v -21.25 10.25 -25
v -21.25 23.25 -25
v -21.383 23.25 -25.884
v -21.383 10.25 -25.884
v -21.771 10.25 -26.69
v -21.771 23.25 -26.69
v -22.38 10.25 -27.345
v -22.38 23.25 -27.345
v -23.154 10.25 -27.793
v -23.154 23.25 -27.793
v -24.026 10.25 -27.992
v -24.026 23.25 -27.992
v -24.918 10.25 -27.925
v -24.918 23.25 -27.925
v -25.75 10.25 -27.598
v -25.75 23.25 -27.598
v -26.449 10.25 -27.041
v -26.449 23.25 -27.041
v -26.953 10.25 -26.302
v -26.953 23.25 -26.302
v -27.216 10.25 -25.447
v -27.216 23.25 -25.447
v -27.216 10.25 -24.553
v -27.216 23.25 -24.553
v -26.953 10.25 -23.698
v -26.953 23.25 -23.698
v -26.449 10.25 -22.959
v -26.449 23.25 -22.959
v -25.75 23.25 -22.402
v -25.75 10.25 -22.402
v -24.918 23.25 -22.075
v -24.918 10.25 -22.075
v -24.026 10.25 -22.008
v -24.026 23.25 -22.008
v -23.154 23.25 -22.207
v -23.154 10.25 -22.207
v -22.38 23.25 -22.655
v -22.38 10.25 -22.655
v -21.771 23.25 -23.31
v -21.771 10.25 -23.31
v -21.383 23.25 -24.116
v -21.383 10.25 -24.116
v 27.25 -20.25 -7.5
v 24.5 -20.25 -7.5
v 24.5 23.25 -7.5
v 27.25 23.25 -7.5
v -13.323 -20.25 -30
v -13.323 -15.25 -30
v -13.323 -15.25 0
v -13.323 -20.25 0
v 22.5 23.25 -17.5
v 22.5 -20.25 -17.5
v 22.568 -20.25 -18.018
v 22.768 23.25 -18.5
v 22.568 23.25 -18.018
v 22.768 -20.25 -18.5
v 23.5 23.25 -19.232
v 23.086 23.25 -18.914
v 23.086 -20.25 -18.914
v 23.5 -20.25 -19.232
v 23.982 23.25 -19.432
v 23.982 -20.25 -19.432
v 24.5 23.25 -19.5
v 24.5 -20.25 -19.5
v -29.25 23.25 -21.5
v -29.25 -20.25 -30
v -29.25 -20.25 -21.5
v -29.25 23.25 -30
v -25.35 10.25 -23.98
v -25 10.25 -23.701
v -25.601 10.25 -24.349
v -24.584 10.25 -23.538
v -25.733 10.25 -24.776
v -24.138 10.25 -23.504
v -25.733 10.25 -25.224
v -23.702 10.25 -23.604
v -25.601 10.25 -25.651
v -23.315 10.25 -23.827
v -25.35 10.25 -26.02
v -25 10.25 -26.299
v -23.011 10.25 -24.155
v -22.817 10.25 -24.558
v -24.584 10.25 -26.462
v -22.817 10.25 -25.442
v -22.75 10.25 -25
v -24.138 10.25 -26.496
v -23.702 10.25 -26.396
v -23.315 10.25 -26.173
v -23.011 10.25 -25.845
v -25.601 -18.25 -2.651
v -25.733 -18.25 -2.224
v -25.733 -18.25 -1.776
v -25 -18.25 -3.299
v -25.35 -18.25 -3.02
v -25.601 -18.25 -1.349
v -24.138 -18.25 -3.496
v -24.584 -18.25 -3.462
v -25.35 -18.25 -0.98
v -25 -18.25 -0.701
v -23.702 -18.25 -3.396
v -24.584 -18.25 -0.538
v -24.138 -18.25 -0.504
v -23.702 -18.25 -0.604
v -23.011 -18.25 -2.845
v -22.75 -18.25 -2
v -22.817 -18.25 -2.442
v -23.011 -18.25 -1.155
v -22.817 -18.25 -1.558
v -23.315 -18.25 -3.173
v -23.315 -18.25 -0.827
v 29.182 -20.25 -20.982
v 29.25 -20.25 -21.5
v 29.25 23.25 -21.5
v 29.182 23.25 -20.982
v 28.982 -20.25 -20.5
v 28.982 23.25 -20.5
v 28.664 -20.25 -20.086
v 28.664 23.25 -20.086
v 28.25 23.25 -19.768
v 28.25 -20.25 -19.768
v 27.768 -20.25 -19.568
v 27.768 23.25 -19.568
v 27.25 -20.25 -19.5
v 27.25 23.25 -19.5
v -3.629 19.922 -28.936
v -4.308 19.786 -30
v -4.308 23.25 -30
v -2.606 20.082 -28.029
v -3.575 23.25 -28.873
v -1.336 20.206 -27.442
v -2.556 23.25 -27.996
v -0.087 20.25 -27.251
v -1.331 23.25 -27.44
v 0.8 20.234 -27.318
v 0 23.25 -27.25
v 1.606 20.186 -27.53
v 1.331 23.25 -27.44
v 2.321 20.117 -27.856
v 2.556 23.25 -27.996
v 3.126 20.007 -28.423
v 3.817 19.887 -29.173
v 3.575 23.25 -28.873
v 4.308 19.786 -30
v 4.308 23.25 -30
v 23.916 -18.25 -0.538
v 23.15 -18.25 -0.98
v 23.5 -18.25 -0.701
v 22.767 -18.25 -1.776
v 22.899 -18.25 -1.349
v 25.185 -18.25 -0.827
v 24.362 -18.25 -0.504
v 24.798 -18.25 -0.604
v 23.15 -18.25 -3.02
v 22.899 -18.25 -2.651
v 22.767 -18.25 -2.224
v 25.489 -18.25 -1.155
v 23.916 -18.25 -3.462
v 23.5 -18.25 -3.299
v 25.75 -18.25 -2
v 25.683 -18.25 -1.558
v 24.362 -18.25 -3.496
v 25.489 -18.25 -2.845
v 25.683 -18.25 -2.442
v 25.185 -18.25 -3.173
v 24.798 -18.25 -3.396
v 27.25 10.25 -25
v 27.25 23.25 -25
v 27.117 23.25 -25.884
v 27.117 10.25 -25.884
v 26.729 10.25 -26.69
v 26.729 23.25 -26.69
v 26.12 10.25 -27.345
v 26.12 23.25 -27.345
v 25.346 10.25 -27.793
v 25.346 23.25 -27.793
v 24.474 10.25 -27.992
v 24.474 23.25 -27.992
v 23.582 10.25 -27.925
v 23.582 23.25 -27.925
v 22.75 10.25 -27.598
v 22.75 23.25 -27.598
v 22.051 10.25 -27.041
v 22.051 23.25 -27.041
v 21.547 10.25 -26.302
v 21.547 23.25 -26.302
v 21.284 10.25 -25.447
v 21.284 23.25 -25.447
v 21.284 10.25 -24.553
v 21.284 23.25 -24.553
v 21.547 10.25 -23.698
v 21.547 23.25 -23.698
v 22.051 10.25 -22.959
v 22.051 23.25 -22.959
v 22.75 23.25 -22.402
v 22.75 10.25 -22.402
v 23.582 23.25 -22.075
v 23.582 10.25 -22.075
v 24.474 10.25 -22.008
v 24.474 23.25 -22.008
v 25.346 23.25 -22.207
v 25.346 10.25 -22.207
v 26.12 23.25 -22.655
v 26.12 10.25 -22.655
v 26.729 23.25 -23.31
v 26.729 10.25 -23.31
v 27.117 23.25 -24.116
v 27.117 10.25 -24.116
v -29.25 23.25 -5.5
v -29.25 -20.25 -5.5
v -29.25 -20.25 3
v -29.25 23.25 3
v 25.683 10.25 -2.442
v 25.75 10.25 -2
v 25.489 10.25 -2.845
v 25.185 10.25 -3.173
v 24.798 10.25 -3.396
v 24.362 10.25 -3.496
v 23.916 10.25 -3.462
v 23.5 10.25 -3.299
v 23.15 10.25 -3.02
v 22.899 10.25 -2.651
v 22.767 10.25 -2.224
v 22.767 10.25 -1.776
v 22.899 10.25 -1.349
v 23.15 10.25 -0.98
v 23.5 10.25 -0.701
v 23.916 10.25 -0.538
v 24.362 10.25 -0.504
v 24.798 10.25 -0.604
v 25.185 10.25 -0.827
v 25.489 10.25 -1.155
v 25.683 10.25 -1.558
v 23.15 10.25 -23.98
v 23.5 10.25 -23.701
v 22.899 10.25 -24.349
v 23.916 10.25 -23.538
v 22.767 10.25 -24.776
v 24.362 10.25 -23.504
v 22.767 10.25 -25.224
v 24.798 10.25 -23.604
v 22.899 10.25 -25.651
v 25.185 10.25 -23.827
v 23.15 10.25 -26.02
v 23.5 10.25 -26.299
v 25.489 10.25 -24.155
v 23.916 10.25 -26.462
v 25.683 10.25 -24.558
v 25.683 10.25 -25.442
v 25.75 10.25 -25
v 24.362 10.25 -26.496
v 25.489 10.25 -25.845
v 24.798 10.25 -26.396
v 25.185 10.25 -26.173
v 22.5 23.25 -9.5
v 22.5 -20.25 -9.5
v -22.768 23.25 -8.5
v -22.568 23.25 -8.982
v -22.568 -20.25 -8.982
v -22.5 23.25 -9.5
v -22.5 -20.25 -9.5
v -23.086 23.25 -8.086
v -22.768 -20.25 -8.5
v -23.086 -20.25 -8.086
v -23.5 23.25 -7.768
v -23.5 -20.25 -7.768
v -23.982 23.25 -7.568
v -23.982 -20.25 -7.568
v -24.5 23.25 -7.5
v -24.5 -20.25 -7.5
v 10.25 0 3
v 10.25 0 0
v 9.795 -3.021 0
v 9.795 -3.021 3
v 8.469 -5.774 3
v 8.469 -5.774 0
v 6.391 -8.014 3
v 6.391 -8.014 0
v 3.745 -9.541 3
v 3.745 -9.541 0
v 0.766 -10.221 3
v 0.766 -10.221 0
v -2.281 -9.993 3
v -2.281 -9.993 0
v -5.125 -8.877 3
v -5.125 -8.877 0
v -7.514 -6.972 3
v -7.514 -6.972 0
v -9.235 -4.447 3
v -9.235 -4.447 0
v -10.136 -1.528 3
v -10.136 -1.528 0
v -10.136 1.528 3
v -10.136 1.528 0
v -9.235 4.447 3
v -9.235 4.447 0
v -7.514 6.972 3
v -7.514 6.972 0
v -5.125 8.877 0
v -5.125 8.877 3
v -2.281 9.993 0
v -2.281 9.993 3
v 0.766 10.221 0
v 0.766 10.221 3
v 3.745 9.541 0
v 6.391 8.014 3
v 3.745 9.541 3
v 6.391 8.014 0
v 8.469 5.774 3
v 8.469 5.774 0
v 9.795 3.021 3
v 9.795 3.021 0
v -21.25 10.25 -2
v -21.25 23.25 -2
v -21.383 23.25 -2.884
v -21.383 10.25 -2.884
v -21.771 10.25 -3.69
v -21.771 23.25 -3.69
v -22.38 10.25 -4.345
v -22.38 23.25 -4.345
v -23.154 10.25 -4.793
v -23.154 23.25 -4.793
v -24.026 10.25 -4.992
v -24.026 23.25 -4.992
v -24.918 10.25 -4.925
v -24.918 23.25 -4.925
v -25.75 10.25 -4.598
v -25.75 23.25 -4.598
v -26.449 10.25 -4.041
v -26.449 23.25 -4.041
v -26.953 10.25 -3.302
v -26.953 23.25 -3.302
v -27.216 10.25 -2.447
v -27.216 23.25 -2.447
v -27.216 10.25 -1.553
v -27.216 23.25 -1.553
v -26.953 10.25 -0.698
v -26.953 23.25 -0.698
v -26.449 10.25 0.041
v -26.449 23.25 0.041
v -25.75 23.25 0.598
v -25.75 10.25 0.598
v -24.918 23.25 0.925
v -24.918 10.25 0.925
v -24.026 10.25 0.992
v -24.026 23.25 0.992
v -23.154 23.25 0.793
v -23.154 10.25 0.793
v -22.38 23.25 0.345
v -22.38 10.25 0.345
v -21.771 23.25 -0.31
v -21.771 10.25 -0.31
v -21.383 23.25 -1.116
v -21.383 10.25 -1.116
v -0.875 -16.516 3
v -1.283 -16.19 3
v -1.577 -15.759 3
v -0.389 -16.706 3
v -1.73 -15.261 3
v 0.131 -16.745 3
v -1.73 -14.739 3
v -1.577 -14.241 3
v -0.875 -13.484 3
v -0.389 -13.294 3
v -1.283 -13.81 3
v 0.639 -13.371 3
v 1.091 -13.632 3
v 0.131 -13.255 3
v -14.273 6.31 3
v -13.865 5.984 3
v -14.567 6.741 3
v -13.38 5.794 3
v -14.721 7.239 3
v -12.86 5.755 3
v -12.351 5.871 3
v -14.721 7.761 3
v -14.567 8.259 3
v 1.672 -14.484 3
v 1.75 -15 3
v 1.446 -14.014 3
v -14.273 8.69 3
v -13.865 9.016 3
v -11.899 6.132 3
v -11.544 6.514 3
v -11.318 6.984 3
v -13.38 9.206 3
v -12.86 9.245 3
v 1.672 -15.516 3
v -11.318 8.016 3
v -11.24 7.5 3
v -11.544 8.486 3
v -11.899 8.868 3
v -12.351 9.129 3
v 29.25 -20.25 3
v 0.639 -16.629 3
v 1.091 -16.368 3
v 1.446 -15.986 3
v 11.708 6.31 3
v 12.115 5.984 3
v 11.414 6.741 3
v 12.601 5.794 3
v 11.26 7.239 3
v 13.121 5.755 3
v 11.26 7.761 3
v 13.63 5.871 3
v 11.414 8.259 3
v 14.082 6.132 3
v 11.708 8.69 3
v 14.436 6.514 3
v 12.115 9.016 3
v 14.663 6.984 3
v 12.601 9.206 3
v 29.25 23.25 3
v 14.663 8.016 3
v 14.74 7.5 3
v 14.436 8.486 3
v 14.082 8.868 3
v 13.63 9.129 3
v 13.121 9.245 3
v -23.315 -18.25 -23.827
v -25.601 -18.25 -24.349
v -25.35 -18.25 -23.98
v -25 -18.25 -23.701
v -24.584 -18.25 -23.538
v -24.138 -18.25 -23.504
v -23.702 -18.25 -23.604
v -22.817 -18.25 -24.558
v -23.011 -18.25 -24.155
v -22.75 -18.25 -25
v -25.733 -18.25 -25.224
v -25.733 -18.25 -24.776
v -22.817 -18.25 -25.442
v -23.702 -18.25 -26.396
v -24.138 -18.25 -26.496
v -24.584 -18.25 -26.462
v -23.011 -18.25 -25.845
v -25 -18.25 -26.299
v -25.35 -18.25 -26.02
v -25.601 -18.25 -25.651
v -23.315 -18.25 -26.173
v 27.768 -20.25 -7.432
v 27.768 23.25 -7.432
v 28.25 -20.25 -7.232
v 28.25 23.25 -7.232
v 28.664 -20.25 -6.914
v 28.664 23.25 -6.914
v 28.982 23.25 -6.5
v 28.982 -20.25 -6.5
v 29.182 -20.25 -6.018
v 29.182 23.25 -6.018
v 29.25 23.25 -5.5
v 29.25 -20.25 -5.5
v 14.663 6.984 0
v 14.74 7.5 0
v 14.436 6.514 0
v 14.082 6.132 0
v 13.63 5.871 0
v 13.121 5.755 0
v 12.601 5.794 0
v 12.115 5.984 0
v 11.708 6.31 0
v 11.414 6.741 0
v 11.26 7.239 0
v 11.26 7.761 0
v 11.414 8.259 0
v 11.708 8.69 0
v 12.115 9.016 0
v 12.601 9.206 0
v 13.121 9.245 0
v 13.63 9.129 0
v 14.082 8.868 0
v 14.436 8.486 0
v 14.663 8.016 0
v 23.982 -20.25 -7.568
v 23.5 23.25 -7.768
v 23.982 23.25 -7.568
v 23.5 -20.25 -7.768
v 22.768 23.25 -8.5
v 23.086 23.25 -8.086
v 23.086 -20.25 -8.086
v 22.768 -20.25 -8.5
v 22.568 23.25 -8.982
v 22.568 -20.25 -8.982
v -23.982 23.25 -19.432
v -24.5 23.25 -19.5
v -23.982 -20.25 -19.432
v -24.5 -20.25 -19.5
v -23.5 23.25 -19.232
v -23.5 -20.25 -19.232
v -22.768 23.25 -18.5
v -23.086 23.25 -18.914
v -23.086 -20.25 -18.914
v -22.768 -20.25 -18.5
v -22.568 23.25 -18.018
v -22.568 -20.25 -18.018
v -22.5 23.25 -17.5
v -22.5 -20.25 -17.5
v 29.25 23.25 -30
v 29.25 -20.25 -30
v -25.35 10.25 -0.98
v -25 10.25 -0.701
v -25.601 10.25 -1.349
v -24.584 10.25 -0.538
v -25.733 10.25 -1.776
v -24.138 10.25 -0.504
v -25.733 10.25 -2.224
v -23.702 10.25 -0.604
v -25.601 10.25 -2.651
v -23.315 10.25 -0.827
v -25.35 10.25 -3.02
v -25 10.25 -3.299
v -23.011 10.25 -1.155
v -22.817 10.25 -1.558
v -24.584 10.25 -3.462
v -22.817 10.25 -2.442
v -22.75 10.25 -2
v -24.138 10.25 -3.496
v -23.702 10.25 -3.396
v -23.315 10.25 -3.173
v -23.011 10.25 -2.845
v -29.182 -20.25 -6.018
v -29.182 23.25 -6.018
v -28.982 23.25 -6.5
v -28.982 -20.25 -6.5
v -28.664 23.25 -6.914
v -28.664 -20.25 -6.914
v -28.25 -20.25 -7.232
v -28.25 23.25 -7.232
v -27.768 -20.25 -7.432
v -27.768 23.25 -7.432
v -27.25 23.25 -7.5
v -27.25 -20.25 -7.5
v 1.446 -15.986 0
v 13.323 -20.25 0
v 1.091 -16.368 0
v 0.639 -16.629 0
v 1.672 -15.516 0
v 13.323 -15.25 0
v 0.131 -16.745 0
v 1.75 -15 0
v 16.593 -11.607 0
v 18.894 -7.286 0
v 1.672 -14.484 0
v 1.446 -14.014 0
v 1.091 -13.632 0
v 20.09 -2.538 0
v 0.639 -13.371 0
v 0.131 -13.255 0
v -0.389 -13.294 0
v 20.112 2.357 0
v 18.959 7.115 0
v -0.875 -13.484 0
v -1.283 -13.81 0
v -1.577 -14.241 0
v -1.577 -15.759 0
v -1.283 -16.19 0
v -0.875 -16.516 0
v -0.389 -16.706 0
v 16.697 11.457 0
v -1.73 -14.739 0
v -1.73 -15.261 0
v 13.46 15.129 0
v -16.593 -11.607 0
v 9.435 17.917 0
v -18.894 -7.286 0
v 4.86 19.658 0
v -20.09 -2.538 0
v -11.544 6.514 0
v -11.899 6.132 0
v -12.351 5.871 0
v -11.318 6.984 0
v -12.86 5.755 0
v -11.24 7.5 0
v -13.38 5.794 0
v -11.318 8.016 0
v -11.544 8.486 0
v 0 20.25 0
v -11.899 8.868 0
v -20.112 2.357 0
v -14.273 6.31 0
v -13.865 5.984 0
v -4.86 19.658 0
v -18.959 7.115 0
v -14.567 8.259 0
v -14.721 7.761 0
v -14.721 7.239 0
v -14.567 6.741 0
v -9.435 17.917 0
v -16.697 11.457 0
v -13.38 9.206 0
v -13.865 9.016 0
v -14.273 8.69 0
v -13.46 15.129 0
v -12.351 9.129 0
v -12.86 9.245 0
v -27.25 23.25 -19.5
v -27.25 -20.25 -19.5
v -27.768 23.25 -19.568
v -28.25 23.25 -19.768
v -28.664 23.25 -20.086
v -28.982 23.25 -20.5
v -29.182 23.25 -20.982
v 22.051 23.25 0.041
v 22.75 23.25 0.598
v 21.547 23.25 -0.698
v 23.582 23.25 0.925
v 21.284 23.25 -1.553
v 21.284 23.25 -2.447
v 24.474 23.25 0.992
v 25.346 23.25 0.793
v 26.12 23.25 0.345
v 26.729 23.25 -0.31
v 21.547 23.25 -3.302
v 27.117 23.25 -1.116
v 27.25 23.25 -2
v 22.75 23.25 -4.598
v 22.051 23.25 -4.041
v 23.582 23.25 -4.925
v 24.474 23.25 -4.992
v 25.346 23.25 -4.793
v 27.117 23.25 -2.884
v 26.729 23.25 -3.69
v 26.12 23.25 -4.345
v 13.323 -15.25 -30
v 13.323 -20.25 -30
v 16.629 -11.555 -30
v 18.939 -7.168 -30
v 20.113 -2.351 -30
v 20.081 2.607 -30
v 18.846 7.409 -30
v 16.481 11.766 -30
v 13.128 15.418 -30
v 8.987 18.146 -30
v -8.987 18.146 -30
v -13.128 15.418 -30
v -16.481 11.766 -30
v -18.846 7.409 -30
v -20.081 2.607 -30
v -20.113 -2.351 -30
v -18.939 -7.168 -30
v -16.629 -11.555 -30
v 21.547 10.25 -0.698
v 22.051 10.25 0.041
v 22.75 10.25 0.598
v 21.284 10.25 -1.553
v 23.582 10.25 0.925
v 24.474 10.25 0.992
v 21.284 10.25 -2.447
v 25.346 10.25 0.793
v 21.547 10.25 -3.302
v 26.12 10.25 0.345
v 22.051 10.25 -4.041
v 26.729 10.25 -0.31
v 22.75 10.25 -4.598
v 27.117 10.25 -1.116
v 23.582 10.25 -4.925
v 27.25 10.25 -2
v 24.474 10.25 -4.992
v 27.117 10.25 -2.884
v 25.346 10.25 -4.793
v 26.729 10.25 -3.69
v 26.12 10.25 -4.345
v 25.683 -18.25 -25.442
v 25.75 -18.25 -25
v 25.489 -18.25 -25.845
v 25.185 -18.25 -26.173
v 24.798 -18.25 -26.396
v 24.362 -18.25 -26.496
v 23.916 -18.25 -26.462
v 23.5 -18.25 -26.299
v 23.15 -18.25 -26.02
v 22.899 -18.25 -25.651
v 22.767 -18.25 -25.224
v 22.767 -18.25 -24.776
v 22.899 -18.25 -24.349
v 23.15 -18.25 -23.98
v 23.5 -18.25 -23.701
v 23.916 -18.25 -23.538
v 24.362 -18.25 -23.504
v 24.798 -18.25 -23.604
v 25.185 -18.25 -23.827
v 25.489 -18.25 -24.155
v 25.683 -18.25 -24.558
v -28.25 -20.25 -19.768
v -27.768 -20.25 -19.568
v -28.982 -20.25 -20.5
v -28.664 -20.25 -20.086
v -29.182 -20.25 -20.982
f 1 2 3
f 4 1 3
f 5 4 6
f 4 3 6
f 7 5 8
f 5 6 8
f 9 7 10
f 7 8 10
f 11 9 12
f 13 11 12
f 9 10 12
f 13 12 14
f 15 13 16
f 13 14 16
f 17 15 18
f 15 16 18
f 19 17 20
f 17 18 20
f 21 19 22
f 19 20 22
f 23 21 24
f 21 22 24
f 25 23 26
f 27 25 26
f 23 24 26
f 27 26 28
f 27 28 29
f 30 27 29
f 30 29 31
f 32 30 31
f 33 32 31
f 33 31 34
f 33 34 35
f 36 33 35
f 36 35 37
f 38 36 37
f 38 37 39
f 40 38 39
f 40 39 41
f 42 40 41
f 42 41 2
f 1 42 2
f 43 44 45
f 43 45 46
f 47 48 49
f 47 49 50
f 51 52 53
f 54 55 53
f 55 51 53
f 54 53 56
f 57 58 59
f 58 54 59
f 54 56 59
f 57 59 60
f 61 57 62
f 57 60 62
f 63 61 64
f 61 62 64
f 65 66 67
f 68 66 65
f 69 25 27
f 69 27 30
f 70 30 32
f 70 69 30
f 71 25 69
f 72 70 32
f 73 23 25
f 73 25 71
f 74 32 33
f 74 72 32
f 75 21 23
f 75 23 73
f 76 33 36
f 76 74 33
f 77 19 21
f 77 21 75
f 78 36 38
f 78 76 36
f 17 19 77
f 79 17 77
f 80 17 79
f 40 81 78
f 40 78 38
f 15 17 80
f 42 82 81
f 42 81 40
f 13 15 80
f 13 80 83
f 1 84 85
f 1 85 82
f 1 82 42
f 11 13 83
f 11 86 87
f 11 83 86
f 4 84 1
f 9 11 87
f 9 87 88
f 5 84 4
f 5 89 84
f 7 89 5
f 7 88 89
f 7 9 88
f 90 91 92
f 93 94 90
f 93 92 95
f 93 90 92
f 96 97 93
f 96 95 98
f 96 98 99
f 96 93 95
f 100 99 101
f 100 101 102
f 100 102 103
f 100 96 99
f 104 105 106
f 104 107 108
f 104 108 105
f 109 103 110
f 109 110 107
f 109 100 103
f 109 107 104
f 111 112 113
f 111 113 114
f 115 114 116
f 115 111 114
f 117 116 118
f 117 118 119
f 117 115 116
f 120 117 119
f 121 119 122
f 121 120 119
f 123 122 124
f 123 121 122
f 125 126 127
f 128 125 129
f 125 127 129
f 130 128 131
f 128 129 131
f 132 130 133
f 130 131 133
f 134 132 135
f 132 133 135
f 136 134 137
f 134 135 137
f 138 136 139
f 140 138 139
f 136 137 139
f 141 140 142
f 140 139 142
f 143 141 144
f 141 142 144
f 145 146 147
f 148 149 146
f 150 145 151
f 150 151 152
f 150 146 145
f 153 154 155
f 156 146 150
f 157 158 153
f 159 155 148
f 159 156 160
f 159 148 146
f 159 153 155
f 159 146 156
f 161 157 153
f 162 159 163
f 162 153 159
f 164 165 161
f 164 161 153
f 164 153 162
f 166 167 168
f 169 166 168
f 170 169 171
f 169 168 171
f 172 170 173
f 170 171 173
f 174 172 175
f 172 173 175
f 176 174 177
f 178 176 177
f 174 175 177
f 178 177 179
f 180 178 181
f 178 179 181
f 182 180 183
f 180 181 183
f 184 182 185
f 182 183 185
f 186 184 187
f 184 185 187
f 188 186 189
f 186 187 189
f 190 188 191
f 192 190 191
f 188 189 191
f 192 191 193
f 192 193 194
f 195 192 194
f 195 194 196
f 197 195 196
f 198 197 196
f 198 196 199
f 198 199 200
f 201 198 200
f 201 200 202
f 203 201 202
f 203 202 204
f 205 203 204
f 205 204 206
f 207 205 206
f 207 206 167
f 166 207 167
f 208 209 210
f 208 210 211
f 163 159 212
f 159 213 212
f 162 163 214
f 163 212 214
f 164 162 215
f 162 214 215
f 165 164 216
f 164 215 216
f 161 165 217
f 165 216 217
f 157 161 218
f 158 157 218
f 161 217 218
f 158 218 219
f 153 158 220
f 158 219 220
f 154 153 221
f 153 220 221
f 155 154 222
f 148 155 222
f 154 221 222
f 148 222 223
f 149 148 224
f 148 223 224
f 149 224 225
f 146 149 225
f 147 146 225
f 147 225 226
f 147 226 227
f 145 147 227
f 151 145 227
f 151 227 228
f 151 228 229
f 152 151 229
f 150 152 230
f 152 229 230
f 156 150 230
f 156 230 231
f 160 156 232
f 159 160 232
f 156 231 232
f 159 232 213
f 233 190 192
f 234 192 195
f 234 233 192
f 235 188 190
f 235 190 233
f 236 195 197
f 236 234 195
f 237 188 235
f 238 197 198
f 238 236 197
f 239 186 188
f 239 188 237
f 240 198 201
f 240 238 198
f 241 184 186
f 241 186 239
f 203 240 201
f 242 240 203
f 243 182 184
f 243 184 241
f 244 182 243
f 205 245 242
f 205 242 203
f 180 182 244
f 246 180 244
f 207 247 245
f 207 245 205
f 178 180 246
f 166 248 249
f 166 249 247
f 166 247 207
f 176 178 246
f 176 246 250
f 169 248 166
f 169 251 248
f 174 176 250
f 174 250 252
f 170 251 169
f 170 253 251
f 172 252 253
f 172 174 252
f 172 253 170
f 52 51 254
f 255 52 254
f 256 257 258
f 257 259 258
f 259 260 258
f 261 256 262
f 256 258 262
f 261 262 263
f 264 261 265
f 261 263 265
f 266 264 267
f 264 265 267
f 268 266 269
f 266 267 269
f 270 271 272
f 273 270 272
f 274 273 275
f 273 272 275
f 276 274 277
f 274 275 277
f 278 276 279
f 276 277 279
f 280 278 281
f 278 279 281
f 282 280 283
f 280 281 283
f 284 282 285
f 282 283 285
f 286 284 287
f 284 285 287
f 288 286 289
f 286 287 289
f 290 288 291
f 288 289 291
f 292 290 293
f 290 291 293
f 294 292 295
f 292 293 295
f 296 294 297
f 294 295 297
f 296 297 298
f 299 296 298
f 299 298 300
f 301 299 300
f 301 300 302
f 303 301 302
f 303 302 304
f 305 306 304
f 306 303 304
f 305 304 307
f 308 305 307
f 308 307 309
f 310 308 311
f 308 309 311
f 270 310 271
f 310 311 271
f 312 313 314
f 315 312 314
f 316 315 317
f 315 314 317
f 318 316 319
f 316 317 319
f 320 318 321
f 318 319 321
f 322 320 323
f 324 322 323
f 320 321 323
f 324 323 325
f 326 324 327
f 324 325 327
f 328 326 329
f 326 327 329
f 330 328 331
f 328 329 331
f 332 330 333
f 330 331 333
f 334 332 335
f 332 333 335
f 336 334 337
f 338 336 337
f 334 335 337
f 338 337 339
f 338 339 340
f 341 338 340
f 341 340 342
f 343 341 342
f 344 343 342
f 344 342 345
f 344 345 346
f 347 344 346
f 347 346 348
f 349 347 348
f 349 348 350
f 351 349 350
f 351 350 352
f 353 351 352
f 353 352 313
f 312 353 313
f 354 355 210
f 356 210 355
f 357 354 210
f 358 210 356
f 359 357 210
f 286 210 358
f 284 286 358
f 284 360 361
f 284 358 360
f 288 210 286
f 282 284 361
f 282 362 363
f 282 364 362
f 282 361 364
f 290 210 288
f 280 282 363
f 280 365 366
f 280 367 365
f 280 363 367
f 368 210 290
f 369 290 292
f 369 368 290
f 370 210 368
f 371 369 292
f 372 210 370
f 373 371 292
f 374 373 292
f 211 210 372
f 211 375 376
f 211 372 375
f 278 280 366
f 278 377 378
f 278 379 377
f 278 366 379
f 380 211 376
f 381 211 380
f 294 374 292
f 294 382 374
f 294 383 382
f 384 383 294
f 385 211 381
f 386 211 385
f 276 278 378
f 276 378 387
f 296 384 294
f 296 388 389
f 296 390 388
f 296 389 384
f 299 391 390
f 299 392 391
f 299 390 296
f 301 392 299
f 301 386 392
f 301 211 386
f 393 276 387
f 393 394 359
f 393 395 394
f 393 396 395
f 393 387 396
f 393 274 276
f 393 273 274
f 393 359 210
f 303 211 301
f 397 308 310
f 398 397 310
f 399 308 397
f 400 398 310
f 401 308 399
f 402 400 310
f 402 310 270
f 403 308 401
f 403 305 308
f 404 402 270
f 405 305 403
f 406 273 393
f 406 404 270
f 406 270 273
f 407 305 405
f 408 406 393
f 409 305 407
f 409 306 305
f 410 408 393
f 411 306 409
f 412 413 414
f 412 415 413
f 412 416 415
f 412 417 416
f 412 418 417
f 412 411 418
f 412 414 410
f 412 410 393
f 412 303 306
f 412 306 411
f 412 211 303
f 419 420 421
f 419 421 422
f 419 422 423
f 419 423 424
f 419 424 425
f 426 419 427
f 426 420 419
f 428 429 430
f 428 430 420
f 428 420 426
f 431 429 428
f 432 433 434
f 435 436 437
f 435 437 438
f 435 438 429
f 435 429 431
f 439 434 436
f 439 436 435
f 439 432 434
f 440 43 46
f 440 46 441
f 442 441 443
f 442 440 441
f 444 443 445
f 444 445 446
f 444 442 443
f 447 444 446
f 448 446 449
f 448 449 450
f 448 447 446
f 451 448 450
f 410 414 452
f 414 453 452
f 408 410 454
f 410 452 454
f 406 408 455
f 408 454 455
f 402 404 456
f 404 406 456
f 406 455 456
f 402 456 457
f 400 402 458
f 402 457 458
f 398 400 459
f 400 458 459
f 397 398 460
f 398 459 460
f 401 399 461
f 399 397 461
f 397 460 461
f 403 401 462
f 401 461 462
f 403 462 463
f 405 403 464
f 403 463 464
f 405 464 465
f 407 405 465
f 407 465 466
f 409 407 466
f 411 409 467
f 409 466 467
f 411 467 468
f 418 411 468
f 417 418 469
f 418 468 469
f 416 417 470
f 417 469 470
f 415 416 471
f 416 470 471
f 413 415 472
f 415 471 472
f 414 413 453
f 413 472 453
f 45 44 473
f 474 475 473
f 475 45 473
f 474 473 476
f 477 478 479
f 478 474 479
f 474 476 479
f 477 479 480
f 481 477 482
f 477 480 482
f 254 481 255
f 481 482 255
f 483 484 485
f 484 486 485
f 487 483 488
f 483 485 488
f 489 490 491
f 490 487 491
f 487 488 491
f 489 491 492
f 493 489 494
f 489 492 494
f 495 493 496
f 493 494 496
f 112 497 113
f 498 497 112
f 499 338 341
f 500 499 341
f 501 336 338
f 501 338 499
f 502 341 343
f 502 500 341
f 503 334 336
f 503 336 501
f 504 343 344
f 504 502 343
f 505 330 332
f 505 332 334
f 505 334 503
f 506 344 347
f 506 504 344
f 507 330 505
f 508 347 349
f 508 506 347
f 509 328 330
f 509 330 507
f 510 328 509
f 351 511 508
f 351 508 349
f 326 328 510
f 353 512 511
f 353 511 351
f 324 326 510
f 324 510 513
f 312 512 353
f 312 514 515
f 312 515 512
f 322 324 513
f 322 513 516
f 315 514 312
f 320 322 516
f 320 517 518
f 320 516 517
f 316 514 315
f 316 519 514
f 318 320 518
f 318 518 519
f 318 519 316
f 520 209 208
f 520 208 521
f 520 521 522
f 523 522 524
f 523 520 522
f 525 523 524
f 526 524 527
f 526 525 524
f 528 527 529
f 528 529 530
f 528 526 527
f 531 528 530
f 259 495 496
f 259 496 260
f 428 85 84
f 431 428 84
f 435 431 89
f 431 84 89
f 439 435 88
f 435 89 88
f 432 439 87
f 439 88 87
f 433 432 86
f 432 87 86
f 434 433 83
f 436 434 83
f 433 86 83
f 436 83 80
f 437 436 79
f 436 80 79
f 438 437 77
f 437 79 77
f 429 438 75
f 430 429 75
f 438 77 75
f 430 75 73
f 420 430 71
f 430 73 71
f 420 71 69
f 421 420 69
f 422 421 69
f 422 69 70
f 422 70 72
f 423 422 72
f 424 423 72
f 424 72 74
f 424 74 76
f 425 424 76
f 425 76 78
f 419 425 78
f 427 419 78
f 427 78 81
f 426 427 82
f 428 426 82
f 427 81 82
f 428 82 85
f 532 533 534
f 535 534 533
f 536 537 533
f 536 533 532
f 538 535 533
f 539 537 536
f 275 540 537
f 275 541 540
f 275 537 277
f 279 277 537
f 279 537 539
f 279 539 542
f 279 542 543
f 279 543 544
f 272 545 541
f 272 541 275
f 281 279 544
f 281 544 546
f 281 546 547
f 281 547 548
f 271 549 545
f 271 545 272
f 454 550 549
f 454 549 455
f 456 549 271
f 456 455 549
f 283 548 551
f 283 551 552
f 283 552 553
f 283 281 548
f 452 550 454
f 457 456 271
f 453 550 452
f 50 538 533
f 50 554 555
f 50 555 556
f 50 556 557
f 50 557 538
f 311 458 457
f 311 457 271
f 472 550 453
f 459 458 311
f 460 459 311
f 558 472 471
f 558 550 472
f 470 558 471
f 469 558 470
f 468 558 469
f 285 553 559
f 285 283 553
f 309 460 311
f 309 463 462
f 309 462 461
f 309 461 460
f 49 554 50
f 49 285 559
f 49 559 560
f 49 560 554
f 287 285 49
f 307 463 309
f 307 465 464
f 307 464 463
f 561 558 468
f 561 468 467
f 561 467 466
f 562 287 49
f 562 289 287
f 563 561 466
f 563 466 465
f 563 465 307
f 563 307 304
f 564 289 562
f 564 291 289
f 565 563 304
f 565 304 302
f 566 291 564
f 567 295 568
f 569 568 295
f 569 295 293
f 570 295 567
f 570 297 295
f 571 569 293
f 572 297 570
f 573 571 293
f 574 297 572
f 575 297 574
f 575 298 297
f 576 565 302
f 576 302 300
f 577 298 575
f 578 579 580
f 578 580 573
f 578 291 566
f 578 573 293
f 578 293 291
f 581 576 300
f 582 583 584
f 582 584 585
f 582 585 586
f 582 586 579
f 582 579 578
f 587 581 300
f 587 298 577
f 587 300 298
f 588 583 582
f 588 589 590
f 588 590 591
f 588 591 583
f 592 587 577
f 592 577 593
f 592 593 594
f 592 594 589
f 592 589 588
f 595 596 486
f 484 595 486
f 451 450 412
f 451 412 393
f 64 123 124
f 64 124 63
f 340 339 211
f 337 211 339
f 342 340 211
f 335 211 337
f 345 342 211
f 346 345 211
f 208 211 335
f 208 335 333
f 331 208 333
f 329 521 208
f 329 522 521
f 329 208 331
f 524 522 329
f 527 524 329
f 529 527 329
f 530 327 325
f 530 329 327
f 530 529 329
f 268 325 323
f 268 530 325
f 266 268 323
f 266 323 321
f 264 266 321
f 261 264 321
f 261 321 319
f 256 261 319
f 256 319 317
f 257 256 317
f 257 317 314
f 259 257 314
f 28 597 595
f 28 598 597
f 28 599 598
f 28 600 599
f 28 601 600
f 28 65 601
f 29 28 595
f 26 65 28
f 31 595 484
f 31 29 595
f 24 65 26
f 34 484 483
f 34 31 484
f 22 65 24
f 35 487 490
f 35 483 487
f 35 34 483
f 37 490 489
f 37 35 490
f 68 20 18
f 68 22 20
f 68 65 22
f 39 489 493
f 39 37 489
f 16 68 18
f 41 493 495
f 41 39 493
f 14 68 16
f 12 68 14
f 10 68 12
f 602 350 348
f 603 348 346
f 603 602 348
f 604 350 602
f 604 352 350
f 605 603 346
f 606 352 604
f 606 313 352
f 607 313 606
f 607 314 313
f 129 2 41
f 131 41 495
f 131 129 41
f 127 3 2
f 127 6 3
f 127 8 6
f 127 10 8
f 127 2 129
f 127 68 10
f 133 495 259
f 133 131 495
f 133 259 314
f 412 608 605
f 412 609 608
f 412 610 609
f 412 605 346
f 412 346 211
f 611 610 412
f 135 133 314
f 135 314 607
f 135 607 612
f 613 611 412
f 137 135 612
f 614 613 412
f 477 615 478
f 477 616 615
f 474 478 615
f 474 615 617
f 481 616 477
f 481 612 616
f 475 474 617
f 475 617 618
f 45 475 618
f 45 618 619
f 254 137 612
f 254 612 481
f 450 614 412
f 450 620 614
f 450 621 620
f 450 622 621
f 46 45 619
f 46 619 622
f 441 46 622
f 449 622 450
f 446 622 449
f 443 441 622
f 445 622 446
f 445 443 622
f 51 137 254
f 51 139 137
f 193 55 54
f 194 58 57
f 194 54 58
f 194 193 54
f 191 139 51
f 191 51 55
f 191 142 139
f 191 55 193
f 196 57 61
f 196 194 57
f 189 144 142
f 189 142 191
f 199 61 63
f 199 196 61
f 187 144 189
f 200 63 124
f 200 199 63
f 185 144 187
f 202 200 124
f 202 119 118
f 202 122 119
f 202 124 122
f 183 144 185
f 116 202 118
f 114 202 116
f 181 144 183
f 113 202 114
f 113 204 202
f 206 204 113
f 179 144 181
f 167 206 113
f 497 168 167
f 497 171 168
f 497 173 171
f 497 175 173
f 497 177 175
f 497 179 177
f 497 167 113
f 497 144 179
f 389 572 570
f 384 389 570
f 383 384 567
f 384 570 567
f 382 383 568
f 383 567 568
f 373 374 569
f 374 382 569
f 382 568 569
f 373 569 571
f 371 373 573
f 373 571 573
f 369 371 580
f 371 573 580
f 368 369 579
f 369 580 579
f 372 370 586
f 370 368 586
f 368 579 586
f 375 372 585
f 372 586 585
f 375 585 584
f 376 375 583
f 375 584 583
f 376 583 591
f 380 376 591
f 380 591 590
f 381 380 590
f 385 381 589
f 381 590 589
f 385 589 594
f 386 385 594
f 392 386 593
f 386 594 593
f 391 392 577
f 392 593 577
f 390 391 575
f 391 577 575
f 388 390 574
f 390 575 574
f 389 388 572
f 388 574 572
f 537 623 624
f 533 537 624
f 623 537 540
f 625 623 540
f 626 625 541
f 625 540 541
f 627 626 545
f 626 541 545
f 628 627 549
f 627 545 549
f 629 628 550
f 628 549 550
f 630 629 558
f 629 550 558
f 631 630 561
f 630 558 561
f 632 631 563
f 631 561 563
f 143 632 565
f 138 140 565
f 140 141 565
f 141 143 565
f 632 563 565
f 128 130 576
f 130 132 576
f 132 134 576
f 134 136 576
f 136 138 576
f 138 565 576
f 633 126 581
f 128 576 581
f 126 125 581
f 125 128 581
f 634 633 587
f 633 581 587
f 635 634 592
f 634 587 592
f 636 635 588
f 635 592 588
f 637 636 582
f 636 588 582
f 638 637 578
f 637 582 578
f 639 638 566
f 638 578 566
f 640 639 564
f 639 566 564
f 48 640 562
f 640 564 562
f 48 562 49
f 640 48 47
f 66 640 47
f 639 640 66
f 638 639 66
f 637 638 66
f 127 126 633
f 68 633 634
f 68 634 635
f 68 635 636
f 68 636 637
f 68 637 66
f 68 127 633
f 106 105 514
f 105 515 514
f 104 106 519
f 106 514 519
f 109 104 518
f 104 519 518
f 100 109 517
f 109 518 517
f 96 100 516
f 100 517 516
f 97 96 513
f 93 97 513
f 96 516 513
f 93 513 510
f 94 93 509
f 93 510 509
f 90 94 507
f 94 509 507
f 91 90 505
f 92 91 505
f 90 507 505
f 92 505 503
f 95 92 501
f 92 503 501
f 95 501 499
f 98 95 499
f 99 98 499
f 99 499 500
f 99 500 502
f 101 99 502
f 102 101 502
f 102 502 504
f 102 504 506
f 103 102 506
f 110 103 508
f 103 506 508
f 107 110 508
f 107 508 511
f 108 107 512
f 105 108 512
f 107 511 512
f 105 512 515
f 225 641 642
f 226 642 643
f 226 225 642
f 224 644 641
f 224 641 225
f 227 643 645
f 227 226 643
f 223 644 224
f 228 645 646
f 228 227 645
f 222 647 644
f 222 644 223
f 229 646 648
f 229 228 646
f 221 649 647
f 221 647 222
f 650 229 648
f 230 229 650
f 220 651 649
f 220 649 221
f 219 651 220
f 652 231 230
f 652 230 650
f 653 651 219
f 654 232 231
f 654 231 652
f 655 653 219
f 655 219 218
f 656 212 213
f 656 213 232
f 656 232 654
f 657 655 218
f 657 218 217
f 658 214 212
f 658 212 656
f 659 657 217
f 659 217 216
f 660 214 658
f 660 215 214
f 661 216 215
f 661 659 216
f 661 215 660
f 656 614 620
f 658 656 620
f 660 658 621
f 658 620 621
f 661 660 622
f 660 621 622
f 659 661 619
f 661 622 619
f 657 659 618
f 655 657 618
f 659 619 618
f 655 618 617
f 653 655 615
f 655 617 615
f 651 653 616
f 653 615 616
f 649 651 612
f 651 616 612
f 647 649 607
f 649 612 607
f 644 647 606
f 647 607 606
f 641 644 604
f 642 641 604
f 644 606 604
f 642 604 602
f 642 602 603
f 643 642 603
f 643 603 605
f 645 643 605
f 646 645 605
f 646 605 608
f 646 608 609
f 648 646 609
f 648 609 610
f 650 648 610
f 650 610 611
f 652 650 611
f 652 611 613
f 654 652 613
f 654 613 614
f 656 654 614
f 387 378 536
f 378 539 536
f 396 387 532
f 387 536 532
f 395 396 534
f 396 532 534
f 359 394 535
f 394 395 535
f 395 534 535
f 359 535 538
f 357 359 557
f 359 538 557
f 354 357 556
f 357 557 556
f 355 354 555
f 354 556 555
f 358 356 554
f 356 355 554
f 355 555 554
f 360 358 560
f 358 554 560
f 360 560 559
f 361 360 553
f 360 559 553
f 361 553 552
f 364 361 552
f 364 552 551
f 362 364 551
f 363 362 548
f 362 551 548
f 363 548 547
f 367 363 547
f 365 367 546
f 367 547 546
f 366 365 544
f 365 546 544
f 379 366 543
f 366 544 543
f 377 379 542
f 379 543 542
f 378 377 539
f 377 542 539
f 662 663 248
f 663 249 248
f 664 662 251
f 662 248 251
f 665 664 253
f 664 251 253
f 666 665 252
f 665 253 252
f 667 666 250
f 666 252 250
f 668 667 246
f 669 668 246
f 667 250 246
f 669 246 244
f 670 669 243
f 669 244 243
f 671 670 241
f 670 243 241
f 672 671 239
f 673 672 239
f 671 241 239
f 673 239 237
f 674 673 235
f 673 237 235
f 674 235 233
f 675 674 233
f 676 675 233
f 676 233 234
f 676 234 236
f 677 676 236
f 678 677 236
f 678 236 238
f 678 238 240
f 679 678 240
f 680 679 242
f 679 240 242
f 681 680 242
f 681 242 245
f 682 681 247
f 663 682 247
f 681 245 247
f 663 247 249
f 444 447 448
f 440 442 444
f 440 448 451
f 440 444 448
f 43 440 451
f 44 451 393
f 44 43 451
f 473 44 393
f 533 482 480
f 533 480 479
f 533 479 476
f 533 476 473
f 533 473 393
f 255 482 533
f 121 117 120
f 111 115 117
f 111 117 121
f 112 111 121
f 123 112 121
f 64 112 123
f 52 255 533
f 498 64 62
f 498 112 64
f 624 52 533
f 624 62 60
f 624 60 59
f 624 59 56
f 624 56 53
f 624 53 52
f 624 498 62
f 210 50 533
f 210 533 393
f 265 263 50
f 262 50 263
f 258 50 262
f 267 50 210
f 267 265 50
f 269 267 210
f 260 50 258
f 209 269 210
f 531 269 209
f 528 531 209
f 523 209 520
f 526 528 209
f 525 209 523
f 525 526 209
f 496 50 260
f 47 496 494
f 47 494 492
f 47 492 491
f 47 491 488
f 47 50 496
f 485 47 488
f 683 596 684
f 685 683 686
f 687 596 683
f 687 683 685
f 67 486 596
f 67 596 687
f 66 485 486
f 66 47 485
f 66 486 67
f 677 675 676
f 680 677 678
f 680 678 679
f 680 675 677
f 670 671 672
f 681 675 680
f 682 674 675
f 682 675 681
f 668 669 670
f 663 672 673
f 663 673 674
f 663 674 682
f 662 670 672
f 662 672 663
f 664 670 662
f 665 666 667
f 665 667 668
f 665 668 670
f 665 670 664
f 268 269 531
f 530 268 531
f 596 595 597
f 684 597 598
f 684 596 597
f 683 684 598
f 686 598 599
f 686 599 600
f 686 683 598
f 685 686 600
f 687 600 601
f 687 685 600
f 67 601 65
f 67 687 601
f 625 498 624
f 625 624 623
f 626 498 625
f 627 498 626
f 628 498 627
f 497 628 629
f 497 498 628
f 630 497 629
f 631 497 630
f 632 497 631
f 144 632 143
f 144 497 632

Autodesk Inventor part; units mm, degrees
ref_plane "YZ Plane" through (0, 0, 0) normal (1, 0, 0) x (0, 1, 0)
ref_plane "XZ Plane" through (0, 0, 0) normal (0, 1, 0) x (-1, 0, 0)
ref_plane "XY Plane" through (0, 0, 0) normal (0, 0, 1) x (1, 0, 0)
sketch "FrontSketch" plane through (0, 0, 0) normal (0, 0, 1) x (1, 0, 0)
  line L0 (0, 0) -> (0, 22.8261) construction
  line L1 (0, 0) -> (24.783, 0) construction
  circle A0 centre (0, 0) radius 10.25
  circle A1 centre (0, 0) radius 20.25 construction
  line L2 (-29.25, 23.25) -> (29.25, 23.25)
  line L3 (29.25, 23.25) -> (29.25, -20.25)
  line L4 (29.25, -20.25) -> (-29.25, -20.25)
  line L5 (-29.25, -20.25) -> (-29.25, 23.25)
  line L6 (0, 0) -> (-39.7334, 0) construction
  circle A2 centre (0, 0) radius 15 construction
  circle A3 centre (0, -15) radius 1.75
  line L7 (0, 0) -> (0, -25.6264) construction
  circle A4 centre (12.9904, 7.5) radius 1.75
  circle A5 centre (-12.9904, 7.5) radius 1.75
  point P0 (0, 20.25)
  point P1 (-20.25, 0)
  dimension "d25" = 30
  dimension "d21" = 20.5
  dimension "d22" = 40.5
  dimension "d23" = 9
  dimension "d24" = 3
  dimension "d26" = 3.5
  dimension "d29" = 360
extrude "Front" add sketch "FrontSketch" along normal blind 3
sketch "FerruleSketch" plane through (0, 0, 0) normal (0, 0, -1) x (-1, 0, 0)
  circle A0 centre (0, 0) radius 10.25 projected
  line L0 (29.25, 23.25) -> (-29.25, 23.25) projected
  line L1 (-29.25, 23.25) -> (-29.25, -20.25) projected
  line L2 (-29.25, -20.25) -> (29.25, -20.25) projected
  line L3 (29.25, -20.25) -> (29.25, 23.25) projected
  circle A1 centre (0, 0) radius 20.25
  dimension "d33" = 40.5
extrude "Ferrule" add sketch "FerruleSketch" along normal blind 30 contours L3 L2 L1 L0
sketch "Sketch7" plane through (0, 0, -30) normal (0, 0, -1) x (-1, 0, 0)
  line L0 (-29.25, -20.25) -> (29.25, -20.25) projected
  circle A0 centre (0, 0) radius 20.25 projected
  line L1 (-29.25, -20.25) -> (29.25, -20.25) projected
  line L2 (29.25, -20.25) -> (29.25, 23.25) projected
  line L3 (13.3229, -15.25) -> (13.3229, -20.25)
  line L4 (-13.3229, -15.25) -> (-13.3229, -20.25)
  line L5 (0, 0) -> (0, -25.3199) construction
  point P0 (0, -20.25)
  dimension "d37" = 5
extrude "Extrusion8" cut sketch "Sketch7" against normal up to surface (30 mm away) contours L4 A0 L0 | A0 L3 L0
sketch "CableHoleSketch" plane through (-29.25, 23.25, 3) normal (0, 1, 0) x (1, 0, 0)
  line L0 (0, 33) -> (58.5, 33) projected
  line L1 (29.25, 3) -> (29.25, 34.9321) construction
  circle A0 centre (29.25, 35) radius 4.75
  line L2 (49.5, 3) -> (9, 3) projected
  line L3 (24.9416, 33) -> (33.5584, 33)
  point P0 (15.9271, 3)
  point P1 (42.5729, 3)
  dimension "d40" = 32
  dimension "d41" = 9.5
extrude "CableHole" cut sketch "CableHoleSketch" against normal up to next contours L0 A0 picked at (29.25, 32.0833)
sketch "FasteningHoleSketch" plane through (-29.25, 23.25, 3) normal (0, 1, 0) x (1, 0, 0)
  arc A0 (24.9416, 33) -> (33.5584, 33) centre (29.25, 35) ccw projected
  line L0 (33.5584, 33) -> (58.5, 33) projected
  circle A1 centre (5, 5) radius 1.5
  line L1 (29.25, 3) -> (29.25, 35) construction
  line L2 (58.5, 0) -> (0, 0) projected
  line L3 (58.5, 0) -> (58.5, 33) projected
  line L4 (-10.6096, 16.5) -> (55.9901, 16.5) construction
  circle A2 centre (5, 28) radius 1.5
  line L5 (29.25, 30) -> (29.25, -2) construction
  circle A3 centre (53.5, 5) radius 1.5
  circle A4 centre (53.5, 28) radius 1.5
  dimension "d44" = 3
  dimension "d45" = 5
  dimension "d53" = 16.5
extrude "FasteningHole" cut sketch "FasteningHoleSketch" against normal blind 41.5
sketch "CoilSpringHoleSketch" plane through (-29.25, 23.25, 3) normal (0, 1, 0) x (1, 0, 0)
  circle A0 centre (53.5, 5) radius 1.5 projected
  circle A1 centre (5, 5) radius 1.5 projected
  circle A2 centre (5, 28) radius 1.5 projected
  circle A3 centre (53.5, 28) radius 1.5 projected
  arc A4 (24.9416, 33) -> (33.5584, 33) centre (29.25, 35) ccw projected
  line L0 (58.5, 0) -> (0, 0) projected
  line L1 (33.5584, 33) -> (58.5, 33) projected
  circle A5 centre (5, 28) radius 3
  line L2 (29.25, 3) -> (29.25, 35) construction
  line L3 (-9.4478, 16.5) -> (72.8784, 16.5) construction
  circle A6 centre (53.5, 28) radius 3
  circle A7 centre (5, 5) radius 3
  circle A8 centre (53.5, 5) radius 3
  dimension "d54" = 6
  dimension "d55" = 16.5
extrude "CoilSpringHole" cut sketch "CoilSpringHoleSketch" against normal blind 13
sketch "HollowSketch" plane through (-29.25, 23.25, 3) normal (0, 1, 0) x (1, 0, 0)
  circle A0 centre (5, 28) radius 3 projected
  arc A1 (24.9416, 33) -> (33.5584, 33) centre (29.25, 35) ccw projected
  line L0 (0, 33) -> (0, 0) projected
  line L1 (58.5, 0) -> (0, 0) projected
  line L2 (0, 22.5) -> (6.75, 22.5)
  line L3 (6.75, 22.5) -> (6.75, 10.5)
  line L4 (6.75, 10.5) -> (0, 10.5)
  line L5 (0, 10.5) -> (0, 22.5)
  line L6 (29.25, 35) -> (29.25, 3) construction
  line L7 (58.5, 22.5) -> (51.75, 22.5)
  line L8 (51.75, 22.5) -> (51.75, 10.5)
  line L9 (51.75, 10.5) -> (58.5, 10.5)
  line L10 (58.5, 10.5) -> (58.5, 22.5)
  line L11 (-4.7611, 16.5) -> (67.4575, 16.5) construction
  line L12 (9.25, 35.7853) -> (9.25, -4.0496) construction
  dimension "d58" = 16.5
  dimension "d59" = 20
  dimension "d60" = 2.5
  dimension "d61" = 2.5
extrude "Hollow" cut sketch "HollowSketch" against normal up to next contours L2 L3 L4 L0 | L10 L9 L8 L7
fillet "Fillet2" radius 2 8 edges at (-22.5, 1.5, -7.5) (-29.25, 1.5, -7.5) (-22.5, 1.5, -19.5) (-29.25, 1.5, -19.5) (29.25, 1.5, -19.5) (29.25, 1.5, -7.5) (22.5, 1.5, -19.5) (22.5, 1.5, -7.5)
thread "Thread1" size "M3x0.5" class "6H" standard "ANSI Metric M Profile" full length
thread "Thread2" size "M3x0.5" class "6H" standard "ANSI Metric M Profile" full length
thread "Thread3" size "M3x0.5" class "6H" standard "ANSI Metric M Profile" full length
thread "Thread4" size "M3x0.5" class "6H" standard "ANSI Metric M Profile" full length
equation "\"d25\" = 2 * Encoder_FasteningHole_DistanceToCenter"
equation "\"d21\" = Encoder_Bearing_Diameter + EncoderSupport_PlasticShrinkingMargin"
equation "\"d22\" = Encoder_Body_Diameter + EncoderSupport_PlasticShrinkingMargin"
equation "\"d23\" = EncoderSupportInside_SideThickness"
equation "\"d24\" = EncoderSupportInside_TopThickness"
equation "\"d26\" = Encoder_FasteningHole_Diameter + EncoderSupport_PlasticShrinkingMargin"
equation "\"d33\" = Encoder_Body_Diameter + EncoderSupport_PlasticShrinkingMargin"
equation "\"d40\" = Encoder_CableBase_DistanceToTop"
equation "\"d41\" = Encoder_CableBase_Diameter + EncoderSupport_PlasticShrinkingMargin"
equation "\"d44\" = EncoderSupport_FixingHole_Diameter"
equation "\"d45\" = EncoderSupport_FixingnHole_Margin"
equation "\"d53\" = 0.5 * EncoderSupportInside_Length"
equation "\"d54\" = EncoderSupport_CoilSpringHole_Diameter"
equation "\"d55\" = 0.5 * EncoderSupportInside_Length"
equation "\"d58\" = 0.5 * EncoderSupportInside_Length"
equation "\"d59\" = 0.5 * Encoder_Body_Diameter"
equation "\"d60\" = EncoderSupportInside_Hollow_Margin"
equation "\"d61\" = EncoderSupportInside_Hollow_Margin"
equation "\"d65\" = EncoderSupport_Fillet_Size"
equation "\"EncoderSupportInside_Thickness\" = 6"
equation "\"EncoderSupportInside_Length\" = EncoderSupportInside_Front_Thickness + d34"
equation "\"EncoderSupportInside_Width\" = EncoderSupport_PlasticShrinkingMargin + Encoder_Body_Diameter + 2 * EncoderSupportInside_SideThickness"
equation "\"EncoderSupportInside_Height\" = EncoderSupport_PlasticShrinkingMargin + Encoder_Body_Diameter + EncoderSupportInside_Thickness"
equation "\"EncoderSupport_FixingHole_Diameter\" = 3"
equation "\"EncoderSupport_FixingnHole_Margin\" = 5"
equation "\"EncoderSupportInside_SideThickness\" = EncoderSupportInside_Thickness + EncoderSupport_FixingHole_Diameter"
equation "\"EncoderSupport_CoilSpringHole_Diameter\" = 6"
equation "\"EncoderSupportInside_TopThickness\" = 3"
equation "\"EncoderSupportInside_Hollow_Margin\" = 2.5"
equation "\"EncoderSupport_Fillet_Size\" = 2"
equation "\"EncoderSupport_PlasticShrinkingMargin\" = 0.5"
equation "\"Encoder_FasteningHole_DistanceToCenter\" = 15"
equation "\"Encoder_Bearing_Diameter\" = 20"
equation "\"Encoder_Body_Diameter\" = 40"
equation "\"Encoder_FasteningHole_Diameter\" = 3"
equation "\"Encoder_CableBase_DistanceToTop\" = 32"
equation "\"Encoder_CableBase_Diameter\" = 9"
equation "\"EncoderSupportInside_Front_Thickness\" = 3"
equation "\"d34\" = 30"
properties part number "EncoderSupportInside" material "Polyethylene, High Density"
